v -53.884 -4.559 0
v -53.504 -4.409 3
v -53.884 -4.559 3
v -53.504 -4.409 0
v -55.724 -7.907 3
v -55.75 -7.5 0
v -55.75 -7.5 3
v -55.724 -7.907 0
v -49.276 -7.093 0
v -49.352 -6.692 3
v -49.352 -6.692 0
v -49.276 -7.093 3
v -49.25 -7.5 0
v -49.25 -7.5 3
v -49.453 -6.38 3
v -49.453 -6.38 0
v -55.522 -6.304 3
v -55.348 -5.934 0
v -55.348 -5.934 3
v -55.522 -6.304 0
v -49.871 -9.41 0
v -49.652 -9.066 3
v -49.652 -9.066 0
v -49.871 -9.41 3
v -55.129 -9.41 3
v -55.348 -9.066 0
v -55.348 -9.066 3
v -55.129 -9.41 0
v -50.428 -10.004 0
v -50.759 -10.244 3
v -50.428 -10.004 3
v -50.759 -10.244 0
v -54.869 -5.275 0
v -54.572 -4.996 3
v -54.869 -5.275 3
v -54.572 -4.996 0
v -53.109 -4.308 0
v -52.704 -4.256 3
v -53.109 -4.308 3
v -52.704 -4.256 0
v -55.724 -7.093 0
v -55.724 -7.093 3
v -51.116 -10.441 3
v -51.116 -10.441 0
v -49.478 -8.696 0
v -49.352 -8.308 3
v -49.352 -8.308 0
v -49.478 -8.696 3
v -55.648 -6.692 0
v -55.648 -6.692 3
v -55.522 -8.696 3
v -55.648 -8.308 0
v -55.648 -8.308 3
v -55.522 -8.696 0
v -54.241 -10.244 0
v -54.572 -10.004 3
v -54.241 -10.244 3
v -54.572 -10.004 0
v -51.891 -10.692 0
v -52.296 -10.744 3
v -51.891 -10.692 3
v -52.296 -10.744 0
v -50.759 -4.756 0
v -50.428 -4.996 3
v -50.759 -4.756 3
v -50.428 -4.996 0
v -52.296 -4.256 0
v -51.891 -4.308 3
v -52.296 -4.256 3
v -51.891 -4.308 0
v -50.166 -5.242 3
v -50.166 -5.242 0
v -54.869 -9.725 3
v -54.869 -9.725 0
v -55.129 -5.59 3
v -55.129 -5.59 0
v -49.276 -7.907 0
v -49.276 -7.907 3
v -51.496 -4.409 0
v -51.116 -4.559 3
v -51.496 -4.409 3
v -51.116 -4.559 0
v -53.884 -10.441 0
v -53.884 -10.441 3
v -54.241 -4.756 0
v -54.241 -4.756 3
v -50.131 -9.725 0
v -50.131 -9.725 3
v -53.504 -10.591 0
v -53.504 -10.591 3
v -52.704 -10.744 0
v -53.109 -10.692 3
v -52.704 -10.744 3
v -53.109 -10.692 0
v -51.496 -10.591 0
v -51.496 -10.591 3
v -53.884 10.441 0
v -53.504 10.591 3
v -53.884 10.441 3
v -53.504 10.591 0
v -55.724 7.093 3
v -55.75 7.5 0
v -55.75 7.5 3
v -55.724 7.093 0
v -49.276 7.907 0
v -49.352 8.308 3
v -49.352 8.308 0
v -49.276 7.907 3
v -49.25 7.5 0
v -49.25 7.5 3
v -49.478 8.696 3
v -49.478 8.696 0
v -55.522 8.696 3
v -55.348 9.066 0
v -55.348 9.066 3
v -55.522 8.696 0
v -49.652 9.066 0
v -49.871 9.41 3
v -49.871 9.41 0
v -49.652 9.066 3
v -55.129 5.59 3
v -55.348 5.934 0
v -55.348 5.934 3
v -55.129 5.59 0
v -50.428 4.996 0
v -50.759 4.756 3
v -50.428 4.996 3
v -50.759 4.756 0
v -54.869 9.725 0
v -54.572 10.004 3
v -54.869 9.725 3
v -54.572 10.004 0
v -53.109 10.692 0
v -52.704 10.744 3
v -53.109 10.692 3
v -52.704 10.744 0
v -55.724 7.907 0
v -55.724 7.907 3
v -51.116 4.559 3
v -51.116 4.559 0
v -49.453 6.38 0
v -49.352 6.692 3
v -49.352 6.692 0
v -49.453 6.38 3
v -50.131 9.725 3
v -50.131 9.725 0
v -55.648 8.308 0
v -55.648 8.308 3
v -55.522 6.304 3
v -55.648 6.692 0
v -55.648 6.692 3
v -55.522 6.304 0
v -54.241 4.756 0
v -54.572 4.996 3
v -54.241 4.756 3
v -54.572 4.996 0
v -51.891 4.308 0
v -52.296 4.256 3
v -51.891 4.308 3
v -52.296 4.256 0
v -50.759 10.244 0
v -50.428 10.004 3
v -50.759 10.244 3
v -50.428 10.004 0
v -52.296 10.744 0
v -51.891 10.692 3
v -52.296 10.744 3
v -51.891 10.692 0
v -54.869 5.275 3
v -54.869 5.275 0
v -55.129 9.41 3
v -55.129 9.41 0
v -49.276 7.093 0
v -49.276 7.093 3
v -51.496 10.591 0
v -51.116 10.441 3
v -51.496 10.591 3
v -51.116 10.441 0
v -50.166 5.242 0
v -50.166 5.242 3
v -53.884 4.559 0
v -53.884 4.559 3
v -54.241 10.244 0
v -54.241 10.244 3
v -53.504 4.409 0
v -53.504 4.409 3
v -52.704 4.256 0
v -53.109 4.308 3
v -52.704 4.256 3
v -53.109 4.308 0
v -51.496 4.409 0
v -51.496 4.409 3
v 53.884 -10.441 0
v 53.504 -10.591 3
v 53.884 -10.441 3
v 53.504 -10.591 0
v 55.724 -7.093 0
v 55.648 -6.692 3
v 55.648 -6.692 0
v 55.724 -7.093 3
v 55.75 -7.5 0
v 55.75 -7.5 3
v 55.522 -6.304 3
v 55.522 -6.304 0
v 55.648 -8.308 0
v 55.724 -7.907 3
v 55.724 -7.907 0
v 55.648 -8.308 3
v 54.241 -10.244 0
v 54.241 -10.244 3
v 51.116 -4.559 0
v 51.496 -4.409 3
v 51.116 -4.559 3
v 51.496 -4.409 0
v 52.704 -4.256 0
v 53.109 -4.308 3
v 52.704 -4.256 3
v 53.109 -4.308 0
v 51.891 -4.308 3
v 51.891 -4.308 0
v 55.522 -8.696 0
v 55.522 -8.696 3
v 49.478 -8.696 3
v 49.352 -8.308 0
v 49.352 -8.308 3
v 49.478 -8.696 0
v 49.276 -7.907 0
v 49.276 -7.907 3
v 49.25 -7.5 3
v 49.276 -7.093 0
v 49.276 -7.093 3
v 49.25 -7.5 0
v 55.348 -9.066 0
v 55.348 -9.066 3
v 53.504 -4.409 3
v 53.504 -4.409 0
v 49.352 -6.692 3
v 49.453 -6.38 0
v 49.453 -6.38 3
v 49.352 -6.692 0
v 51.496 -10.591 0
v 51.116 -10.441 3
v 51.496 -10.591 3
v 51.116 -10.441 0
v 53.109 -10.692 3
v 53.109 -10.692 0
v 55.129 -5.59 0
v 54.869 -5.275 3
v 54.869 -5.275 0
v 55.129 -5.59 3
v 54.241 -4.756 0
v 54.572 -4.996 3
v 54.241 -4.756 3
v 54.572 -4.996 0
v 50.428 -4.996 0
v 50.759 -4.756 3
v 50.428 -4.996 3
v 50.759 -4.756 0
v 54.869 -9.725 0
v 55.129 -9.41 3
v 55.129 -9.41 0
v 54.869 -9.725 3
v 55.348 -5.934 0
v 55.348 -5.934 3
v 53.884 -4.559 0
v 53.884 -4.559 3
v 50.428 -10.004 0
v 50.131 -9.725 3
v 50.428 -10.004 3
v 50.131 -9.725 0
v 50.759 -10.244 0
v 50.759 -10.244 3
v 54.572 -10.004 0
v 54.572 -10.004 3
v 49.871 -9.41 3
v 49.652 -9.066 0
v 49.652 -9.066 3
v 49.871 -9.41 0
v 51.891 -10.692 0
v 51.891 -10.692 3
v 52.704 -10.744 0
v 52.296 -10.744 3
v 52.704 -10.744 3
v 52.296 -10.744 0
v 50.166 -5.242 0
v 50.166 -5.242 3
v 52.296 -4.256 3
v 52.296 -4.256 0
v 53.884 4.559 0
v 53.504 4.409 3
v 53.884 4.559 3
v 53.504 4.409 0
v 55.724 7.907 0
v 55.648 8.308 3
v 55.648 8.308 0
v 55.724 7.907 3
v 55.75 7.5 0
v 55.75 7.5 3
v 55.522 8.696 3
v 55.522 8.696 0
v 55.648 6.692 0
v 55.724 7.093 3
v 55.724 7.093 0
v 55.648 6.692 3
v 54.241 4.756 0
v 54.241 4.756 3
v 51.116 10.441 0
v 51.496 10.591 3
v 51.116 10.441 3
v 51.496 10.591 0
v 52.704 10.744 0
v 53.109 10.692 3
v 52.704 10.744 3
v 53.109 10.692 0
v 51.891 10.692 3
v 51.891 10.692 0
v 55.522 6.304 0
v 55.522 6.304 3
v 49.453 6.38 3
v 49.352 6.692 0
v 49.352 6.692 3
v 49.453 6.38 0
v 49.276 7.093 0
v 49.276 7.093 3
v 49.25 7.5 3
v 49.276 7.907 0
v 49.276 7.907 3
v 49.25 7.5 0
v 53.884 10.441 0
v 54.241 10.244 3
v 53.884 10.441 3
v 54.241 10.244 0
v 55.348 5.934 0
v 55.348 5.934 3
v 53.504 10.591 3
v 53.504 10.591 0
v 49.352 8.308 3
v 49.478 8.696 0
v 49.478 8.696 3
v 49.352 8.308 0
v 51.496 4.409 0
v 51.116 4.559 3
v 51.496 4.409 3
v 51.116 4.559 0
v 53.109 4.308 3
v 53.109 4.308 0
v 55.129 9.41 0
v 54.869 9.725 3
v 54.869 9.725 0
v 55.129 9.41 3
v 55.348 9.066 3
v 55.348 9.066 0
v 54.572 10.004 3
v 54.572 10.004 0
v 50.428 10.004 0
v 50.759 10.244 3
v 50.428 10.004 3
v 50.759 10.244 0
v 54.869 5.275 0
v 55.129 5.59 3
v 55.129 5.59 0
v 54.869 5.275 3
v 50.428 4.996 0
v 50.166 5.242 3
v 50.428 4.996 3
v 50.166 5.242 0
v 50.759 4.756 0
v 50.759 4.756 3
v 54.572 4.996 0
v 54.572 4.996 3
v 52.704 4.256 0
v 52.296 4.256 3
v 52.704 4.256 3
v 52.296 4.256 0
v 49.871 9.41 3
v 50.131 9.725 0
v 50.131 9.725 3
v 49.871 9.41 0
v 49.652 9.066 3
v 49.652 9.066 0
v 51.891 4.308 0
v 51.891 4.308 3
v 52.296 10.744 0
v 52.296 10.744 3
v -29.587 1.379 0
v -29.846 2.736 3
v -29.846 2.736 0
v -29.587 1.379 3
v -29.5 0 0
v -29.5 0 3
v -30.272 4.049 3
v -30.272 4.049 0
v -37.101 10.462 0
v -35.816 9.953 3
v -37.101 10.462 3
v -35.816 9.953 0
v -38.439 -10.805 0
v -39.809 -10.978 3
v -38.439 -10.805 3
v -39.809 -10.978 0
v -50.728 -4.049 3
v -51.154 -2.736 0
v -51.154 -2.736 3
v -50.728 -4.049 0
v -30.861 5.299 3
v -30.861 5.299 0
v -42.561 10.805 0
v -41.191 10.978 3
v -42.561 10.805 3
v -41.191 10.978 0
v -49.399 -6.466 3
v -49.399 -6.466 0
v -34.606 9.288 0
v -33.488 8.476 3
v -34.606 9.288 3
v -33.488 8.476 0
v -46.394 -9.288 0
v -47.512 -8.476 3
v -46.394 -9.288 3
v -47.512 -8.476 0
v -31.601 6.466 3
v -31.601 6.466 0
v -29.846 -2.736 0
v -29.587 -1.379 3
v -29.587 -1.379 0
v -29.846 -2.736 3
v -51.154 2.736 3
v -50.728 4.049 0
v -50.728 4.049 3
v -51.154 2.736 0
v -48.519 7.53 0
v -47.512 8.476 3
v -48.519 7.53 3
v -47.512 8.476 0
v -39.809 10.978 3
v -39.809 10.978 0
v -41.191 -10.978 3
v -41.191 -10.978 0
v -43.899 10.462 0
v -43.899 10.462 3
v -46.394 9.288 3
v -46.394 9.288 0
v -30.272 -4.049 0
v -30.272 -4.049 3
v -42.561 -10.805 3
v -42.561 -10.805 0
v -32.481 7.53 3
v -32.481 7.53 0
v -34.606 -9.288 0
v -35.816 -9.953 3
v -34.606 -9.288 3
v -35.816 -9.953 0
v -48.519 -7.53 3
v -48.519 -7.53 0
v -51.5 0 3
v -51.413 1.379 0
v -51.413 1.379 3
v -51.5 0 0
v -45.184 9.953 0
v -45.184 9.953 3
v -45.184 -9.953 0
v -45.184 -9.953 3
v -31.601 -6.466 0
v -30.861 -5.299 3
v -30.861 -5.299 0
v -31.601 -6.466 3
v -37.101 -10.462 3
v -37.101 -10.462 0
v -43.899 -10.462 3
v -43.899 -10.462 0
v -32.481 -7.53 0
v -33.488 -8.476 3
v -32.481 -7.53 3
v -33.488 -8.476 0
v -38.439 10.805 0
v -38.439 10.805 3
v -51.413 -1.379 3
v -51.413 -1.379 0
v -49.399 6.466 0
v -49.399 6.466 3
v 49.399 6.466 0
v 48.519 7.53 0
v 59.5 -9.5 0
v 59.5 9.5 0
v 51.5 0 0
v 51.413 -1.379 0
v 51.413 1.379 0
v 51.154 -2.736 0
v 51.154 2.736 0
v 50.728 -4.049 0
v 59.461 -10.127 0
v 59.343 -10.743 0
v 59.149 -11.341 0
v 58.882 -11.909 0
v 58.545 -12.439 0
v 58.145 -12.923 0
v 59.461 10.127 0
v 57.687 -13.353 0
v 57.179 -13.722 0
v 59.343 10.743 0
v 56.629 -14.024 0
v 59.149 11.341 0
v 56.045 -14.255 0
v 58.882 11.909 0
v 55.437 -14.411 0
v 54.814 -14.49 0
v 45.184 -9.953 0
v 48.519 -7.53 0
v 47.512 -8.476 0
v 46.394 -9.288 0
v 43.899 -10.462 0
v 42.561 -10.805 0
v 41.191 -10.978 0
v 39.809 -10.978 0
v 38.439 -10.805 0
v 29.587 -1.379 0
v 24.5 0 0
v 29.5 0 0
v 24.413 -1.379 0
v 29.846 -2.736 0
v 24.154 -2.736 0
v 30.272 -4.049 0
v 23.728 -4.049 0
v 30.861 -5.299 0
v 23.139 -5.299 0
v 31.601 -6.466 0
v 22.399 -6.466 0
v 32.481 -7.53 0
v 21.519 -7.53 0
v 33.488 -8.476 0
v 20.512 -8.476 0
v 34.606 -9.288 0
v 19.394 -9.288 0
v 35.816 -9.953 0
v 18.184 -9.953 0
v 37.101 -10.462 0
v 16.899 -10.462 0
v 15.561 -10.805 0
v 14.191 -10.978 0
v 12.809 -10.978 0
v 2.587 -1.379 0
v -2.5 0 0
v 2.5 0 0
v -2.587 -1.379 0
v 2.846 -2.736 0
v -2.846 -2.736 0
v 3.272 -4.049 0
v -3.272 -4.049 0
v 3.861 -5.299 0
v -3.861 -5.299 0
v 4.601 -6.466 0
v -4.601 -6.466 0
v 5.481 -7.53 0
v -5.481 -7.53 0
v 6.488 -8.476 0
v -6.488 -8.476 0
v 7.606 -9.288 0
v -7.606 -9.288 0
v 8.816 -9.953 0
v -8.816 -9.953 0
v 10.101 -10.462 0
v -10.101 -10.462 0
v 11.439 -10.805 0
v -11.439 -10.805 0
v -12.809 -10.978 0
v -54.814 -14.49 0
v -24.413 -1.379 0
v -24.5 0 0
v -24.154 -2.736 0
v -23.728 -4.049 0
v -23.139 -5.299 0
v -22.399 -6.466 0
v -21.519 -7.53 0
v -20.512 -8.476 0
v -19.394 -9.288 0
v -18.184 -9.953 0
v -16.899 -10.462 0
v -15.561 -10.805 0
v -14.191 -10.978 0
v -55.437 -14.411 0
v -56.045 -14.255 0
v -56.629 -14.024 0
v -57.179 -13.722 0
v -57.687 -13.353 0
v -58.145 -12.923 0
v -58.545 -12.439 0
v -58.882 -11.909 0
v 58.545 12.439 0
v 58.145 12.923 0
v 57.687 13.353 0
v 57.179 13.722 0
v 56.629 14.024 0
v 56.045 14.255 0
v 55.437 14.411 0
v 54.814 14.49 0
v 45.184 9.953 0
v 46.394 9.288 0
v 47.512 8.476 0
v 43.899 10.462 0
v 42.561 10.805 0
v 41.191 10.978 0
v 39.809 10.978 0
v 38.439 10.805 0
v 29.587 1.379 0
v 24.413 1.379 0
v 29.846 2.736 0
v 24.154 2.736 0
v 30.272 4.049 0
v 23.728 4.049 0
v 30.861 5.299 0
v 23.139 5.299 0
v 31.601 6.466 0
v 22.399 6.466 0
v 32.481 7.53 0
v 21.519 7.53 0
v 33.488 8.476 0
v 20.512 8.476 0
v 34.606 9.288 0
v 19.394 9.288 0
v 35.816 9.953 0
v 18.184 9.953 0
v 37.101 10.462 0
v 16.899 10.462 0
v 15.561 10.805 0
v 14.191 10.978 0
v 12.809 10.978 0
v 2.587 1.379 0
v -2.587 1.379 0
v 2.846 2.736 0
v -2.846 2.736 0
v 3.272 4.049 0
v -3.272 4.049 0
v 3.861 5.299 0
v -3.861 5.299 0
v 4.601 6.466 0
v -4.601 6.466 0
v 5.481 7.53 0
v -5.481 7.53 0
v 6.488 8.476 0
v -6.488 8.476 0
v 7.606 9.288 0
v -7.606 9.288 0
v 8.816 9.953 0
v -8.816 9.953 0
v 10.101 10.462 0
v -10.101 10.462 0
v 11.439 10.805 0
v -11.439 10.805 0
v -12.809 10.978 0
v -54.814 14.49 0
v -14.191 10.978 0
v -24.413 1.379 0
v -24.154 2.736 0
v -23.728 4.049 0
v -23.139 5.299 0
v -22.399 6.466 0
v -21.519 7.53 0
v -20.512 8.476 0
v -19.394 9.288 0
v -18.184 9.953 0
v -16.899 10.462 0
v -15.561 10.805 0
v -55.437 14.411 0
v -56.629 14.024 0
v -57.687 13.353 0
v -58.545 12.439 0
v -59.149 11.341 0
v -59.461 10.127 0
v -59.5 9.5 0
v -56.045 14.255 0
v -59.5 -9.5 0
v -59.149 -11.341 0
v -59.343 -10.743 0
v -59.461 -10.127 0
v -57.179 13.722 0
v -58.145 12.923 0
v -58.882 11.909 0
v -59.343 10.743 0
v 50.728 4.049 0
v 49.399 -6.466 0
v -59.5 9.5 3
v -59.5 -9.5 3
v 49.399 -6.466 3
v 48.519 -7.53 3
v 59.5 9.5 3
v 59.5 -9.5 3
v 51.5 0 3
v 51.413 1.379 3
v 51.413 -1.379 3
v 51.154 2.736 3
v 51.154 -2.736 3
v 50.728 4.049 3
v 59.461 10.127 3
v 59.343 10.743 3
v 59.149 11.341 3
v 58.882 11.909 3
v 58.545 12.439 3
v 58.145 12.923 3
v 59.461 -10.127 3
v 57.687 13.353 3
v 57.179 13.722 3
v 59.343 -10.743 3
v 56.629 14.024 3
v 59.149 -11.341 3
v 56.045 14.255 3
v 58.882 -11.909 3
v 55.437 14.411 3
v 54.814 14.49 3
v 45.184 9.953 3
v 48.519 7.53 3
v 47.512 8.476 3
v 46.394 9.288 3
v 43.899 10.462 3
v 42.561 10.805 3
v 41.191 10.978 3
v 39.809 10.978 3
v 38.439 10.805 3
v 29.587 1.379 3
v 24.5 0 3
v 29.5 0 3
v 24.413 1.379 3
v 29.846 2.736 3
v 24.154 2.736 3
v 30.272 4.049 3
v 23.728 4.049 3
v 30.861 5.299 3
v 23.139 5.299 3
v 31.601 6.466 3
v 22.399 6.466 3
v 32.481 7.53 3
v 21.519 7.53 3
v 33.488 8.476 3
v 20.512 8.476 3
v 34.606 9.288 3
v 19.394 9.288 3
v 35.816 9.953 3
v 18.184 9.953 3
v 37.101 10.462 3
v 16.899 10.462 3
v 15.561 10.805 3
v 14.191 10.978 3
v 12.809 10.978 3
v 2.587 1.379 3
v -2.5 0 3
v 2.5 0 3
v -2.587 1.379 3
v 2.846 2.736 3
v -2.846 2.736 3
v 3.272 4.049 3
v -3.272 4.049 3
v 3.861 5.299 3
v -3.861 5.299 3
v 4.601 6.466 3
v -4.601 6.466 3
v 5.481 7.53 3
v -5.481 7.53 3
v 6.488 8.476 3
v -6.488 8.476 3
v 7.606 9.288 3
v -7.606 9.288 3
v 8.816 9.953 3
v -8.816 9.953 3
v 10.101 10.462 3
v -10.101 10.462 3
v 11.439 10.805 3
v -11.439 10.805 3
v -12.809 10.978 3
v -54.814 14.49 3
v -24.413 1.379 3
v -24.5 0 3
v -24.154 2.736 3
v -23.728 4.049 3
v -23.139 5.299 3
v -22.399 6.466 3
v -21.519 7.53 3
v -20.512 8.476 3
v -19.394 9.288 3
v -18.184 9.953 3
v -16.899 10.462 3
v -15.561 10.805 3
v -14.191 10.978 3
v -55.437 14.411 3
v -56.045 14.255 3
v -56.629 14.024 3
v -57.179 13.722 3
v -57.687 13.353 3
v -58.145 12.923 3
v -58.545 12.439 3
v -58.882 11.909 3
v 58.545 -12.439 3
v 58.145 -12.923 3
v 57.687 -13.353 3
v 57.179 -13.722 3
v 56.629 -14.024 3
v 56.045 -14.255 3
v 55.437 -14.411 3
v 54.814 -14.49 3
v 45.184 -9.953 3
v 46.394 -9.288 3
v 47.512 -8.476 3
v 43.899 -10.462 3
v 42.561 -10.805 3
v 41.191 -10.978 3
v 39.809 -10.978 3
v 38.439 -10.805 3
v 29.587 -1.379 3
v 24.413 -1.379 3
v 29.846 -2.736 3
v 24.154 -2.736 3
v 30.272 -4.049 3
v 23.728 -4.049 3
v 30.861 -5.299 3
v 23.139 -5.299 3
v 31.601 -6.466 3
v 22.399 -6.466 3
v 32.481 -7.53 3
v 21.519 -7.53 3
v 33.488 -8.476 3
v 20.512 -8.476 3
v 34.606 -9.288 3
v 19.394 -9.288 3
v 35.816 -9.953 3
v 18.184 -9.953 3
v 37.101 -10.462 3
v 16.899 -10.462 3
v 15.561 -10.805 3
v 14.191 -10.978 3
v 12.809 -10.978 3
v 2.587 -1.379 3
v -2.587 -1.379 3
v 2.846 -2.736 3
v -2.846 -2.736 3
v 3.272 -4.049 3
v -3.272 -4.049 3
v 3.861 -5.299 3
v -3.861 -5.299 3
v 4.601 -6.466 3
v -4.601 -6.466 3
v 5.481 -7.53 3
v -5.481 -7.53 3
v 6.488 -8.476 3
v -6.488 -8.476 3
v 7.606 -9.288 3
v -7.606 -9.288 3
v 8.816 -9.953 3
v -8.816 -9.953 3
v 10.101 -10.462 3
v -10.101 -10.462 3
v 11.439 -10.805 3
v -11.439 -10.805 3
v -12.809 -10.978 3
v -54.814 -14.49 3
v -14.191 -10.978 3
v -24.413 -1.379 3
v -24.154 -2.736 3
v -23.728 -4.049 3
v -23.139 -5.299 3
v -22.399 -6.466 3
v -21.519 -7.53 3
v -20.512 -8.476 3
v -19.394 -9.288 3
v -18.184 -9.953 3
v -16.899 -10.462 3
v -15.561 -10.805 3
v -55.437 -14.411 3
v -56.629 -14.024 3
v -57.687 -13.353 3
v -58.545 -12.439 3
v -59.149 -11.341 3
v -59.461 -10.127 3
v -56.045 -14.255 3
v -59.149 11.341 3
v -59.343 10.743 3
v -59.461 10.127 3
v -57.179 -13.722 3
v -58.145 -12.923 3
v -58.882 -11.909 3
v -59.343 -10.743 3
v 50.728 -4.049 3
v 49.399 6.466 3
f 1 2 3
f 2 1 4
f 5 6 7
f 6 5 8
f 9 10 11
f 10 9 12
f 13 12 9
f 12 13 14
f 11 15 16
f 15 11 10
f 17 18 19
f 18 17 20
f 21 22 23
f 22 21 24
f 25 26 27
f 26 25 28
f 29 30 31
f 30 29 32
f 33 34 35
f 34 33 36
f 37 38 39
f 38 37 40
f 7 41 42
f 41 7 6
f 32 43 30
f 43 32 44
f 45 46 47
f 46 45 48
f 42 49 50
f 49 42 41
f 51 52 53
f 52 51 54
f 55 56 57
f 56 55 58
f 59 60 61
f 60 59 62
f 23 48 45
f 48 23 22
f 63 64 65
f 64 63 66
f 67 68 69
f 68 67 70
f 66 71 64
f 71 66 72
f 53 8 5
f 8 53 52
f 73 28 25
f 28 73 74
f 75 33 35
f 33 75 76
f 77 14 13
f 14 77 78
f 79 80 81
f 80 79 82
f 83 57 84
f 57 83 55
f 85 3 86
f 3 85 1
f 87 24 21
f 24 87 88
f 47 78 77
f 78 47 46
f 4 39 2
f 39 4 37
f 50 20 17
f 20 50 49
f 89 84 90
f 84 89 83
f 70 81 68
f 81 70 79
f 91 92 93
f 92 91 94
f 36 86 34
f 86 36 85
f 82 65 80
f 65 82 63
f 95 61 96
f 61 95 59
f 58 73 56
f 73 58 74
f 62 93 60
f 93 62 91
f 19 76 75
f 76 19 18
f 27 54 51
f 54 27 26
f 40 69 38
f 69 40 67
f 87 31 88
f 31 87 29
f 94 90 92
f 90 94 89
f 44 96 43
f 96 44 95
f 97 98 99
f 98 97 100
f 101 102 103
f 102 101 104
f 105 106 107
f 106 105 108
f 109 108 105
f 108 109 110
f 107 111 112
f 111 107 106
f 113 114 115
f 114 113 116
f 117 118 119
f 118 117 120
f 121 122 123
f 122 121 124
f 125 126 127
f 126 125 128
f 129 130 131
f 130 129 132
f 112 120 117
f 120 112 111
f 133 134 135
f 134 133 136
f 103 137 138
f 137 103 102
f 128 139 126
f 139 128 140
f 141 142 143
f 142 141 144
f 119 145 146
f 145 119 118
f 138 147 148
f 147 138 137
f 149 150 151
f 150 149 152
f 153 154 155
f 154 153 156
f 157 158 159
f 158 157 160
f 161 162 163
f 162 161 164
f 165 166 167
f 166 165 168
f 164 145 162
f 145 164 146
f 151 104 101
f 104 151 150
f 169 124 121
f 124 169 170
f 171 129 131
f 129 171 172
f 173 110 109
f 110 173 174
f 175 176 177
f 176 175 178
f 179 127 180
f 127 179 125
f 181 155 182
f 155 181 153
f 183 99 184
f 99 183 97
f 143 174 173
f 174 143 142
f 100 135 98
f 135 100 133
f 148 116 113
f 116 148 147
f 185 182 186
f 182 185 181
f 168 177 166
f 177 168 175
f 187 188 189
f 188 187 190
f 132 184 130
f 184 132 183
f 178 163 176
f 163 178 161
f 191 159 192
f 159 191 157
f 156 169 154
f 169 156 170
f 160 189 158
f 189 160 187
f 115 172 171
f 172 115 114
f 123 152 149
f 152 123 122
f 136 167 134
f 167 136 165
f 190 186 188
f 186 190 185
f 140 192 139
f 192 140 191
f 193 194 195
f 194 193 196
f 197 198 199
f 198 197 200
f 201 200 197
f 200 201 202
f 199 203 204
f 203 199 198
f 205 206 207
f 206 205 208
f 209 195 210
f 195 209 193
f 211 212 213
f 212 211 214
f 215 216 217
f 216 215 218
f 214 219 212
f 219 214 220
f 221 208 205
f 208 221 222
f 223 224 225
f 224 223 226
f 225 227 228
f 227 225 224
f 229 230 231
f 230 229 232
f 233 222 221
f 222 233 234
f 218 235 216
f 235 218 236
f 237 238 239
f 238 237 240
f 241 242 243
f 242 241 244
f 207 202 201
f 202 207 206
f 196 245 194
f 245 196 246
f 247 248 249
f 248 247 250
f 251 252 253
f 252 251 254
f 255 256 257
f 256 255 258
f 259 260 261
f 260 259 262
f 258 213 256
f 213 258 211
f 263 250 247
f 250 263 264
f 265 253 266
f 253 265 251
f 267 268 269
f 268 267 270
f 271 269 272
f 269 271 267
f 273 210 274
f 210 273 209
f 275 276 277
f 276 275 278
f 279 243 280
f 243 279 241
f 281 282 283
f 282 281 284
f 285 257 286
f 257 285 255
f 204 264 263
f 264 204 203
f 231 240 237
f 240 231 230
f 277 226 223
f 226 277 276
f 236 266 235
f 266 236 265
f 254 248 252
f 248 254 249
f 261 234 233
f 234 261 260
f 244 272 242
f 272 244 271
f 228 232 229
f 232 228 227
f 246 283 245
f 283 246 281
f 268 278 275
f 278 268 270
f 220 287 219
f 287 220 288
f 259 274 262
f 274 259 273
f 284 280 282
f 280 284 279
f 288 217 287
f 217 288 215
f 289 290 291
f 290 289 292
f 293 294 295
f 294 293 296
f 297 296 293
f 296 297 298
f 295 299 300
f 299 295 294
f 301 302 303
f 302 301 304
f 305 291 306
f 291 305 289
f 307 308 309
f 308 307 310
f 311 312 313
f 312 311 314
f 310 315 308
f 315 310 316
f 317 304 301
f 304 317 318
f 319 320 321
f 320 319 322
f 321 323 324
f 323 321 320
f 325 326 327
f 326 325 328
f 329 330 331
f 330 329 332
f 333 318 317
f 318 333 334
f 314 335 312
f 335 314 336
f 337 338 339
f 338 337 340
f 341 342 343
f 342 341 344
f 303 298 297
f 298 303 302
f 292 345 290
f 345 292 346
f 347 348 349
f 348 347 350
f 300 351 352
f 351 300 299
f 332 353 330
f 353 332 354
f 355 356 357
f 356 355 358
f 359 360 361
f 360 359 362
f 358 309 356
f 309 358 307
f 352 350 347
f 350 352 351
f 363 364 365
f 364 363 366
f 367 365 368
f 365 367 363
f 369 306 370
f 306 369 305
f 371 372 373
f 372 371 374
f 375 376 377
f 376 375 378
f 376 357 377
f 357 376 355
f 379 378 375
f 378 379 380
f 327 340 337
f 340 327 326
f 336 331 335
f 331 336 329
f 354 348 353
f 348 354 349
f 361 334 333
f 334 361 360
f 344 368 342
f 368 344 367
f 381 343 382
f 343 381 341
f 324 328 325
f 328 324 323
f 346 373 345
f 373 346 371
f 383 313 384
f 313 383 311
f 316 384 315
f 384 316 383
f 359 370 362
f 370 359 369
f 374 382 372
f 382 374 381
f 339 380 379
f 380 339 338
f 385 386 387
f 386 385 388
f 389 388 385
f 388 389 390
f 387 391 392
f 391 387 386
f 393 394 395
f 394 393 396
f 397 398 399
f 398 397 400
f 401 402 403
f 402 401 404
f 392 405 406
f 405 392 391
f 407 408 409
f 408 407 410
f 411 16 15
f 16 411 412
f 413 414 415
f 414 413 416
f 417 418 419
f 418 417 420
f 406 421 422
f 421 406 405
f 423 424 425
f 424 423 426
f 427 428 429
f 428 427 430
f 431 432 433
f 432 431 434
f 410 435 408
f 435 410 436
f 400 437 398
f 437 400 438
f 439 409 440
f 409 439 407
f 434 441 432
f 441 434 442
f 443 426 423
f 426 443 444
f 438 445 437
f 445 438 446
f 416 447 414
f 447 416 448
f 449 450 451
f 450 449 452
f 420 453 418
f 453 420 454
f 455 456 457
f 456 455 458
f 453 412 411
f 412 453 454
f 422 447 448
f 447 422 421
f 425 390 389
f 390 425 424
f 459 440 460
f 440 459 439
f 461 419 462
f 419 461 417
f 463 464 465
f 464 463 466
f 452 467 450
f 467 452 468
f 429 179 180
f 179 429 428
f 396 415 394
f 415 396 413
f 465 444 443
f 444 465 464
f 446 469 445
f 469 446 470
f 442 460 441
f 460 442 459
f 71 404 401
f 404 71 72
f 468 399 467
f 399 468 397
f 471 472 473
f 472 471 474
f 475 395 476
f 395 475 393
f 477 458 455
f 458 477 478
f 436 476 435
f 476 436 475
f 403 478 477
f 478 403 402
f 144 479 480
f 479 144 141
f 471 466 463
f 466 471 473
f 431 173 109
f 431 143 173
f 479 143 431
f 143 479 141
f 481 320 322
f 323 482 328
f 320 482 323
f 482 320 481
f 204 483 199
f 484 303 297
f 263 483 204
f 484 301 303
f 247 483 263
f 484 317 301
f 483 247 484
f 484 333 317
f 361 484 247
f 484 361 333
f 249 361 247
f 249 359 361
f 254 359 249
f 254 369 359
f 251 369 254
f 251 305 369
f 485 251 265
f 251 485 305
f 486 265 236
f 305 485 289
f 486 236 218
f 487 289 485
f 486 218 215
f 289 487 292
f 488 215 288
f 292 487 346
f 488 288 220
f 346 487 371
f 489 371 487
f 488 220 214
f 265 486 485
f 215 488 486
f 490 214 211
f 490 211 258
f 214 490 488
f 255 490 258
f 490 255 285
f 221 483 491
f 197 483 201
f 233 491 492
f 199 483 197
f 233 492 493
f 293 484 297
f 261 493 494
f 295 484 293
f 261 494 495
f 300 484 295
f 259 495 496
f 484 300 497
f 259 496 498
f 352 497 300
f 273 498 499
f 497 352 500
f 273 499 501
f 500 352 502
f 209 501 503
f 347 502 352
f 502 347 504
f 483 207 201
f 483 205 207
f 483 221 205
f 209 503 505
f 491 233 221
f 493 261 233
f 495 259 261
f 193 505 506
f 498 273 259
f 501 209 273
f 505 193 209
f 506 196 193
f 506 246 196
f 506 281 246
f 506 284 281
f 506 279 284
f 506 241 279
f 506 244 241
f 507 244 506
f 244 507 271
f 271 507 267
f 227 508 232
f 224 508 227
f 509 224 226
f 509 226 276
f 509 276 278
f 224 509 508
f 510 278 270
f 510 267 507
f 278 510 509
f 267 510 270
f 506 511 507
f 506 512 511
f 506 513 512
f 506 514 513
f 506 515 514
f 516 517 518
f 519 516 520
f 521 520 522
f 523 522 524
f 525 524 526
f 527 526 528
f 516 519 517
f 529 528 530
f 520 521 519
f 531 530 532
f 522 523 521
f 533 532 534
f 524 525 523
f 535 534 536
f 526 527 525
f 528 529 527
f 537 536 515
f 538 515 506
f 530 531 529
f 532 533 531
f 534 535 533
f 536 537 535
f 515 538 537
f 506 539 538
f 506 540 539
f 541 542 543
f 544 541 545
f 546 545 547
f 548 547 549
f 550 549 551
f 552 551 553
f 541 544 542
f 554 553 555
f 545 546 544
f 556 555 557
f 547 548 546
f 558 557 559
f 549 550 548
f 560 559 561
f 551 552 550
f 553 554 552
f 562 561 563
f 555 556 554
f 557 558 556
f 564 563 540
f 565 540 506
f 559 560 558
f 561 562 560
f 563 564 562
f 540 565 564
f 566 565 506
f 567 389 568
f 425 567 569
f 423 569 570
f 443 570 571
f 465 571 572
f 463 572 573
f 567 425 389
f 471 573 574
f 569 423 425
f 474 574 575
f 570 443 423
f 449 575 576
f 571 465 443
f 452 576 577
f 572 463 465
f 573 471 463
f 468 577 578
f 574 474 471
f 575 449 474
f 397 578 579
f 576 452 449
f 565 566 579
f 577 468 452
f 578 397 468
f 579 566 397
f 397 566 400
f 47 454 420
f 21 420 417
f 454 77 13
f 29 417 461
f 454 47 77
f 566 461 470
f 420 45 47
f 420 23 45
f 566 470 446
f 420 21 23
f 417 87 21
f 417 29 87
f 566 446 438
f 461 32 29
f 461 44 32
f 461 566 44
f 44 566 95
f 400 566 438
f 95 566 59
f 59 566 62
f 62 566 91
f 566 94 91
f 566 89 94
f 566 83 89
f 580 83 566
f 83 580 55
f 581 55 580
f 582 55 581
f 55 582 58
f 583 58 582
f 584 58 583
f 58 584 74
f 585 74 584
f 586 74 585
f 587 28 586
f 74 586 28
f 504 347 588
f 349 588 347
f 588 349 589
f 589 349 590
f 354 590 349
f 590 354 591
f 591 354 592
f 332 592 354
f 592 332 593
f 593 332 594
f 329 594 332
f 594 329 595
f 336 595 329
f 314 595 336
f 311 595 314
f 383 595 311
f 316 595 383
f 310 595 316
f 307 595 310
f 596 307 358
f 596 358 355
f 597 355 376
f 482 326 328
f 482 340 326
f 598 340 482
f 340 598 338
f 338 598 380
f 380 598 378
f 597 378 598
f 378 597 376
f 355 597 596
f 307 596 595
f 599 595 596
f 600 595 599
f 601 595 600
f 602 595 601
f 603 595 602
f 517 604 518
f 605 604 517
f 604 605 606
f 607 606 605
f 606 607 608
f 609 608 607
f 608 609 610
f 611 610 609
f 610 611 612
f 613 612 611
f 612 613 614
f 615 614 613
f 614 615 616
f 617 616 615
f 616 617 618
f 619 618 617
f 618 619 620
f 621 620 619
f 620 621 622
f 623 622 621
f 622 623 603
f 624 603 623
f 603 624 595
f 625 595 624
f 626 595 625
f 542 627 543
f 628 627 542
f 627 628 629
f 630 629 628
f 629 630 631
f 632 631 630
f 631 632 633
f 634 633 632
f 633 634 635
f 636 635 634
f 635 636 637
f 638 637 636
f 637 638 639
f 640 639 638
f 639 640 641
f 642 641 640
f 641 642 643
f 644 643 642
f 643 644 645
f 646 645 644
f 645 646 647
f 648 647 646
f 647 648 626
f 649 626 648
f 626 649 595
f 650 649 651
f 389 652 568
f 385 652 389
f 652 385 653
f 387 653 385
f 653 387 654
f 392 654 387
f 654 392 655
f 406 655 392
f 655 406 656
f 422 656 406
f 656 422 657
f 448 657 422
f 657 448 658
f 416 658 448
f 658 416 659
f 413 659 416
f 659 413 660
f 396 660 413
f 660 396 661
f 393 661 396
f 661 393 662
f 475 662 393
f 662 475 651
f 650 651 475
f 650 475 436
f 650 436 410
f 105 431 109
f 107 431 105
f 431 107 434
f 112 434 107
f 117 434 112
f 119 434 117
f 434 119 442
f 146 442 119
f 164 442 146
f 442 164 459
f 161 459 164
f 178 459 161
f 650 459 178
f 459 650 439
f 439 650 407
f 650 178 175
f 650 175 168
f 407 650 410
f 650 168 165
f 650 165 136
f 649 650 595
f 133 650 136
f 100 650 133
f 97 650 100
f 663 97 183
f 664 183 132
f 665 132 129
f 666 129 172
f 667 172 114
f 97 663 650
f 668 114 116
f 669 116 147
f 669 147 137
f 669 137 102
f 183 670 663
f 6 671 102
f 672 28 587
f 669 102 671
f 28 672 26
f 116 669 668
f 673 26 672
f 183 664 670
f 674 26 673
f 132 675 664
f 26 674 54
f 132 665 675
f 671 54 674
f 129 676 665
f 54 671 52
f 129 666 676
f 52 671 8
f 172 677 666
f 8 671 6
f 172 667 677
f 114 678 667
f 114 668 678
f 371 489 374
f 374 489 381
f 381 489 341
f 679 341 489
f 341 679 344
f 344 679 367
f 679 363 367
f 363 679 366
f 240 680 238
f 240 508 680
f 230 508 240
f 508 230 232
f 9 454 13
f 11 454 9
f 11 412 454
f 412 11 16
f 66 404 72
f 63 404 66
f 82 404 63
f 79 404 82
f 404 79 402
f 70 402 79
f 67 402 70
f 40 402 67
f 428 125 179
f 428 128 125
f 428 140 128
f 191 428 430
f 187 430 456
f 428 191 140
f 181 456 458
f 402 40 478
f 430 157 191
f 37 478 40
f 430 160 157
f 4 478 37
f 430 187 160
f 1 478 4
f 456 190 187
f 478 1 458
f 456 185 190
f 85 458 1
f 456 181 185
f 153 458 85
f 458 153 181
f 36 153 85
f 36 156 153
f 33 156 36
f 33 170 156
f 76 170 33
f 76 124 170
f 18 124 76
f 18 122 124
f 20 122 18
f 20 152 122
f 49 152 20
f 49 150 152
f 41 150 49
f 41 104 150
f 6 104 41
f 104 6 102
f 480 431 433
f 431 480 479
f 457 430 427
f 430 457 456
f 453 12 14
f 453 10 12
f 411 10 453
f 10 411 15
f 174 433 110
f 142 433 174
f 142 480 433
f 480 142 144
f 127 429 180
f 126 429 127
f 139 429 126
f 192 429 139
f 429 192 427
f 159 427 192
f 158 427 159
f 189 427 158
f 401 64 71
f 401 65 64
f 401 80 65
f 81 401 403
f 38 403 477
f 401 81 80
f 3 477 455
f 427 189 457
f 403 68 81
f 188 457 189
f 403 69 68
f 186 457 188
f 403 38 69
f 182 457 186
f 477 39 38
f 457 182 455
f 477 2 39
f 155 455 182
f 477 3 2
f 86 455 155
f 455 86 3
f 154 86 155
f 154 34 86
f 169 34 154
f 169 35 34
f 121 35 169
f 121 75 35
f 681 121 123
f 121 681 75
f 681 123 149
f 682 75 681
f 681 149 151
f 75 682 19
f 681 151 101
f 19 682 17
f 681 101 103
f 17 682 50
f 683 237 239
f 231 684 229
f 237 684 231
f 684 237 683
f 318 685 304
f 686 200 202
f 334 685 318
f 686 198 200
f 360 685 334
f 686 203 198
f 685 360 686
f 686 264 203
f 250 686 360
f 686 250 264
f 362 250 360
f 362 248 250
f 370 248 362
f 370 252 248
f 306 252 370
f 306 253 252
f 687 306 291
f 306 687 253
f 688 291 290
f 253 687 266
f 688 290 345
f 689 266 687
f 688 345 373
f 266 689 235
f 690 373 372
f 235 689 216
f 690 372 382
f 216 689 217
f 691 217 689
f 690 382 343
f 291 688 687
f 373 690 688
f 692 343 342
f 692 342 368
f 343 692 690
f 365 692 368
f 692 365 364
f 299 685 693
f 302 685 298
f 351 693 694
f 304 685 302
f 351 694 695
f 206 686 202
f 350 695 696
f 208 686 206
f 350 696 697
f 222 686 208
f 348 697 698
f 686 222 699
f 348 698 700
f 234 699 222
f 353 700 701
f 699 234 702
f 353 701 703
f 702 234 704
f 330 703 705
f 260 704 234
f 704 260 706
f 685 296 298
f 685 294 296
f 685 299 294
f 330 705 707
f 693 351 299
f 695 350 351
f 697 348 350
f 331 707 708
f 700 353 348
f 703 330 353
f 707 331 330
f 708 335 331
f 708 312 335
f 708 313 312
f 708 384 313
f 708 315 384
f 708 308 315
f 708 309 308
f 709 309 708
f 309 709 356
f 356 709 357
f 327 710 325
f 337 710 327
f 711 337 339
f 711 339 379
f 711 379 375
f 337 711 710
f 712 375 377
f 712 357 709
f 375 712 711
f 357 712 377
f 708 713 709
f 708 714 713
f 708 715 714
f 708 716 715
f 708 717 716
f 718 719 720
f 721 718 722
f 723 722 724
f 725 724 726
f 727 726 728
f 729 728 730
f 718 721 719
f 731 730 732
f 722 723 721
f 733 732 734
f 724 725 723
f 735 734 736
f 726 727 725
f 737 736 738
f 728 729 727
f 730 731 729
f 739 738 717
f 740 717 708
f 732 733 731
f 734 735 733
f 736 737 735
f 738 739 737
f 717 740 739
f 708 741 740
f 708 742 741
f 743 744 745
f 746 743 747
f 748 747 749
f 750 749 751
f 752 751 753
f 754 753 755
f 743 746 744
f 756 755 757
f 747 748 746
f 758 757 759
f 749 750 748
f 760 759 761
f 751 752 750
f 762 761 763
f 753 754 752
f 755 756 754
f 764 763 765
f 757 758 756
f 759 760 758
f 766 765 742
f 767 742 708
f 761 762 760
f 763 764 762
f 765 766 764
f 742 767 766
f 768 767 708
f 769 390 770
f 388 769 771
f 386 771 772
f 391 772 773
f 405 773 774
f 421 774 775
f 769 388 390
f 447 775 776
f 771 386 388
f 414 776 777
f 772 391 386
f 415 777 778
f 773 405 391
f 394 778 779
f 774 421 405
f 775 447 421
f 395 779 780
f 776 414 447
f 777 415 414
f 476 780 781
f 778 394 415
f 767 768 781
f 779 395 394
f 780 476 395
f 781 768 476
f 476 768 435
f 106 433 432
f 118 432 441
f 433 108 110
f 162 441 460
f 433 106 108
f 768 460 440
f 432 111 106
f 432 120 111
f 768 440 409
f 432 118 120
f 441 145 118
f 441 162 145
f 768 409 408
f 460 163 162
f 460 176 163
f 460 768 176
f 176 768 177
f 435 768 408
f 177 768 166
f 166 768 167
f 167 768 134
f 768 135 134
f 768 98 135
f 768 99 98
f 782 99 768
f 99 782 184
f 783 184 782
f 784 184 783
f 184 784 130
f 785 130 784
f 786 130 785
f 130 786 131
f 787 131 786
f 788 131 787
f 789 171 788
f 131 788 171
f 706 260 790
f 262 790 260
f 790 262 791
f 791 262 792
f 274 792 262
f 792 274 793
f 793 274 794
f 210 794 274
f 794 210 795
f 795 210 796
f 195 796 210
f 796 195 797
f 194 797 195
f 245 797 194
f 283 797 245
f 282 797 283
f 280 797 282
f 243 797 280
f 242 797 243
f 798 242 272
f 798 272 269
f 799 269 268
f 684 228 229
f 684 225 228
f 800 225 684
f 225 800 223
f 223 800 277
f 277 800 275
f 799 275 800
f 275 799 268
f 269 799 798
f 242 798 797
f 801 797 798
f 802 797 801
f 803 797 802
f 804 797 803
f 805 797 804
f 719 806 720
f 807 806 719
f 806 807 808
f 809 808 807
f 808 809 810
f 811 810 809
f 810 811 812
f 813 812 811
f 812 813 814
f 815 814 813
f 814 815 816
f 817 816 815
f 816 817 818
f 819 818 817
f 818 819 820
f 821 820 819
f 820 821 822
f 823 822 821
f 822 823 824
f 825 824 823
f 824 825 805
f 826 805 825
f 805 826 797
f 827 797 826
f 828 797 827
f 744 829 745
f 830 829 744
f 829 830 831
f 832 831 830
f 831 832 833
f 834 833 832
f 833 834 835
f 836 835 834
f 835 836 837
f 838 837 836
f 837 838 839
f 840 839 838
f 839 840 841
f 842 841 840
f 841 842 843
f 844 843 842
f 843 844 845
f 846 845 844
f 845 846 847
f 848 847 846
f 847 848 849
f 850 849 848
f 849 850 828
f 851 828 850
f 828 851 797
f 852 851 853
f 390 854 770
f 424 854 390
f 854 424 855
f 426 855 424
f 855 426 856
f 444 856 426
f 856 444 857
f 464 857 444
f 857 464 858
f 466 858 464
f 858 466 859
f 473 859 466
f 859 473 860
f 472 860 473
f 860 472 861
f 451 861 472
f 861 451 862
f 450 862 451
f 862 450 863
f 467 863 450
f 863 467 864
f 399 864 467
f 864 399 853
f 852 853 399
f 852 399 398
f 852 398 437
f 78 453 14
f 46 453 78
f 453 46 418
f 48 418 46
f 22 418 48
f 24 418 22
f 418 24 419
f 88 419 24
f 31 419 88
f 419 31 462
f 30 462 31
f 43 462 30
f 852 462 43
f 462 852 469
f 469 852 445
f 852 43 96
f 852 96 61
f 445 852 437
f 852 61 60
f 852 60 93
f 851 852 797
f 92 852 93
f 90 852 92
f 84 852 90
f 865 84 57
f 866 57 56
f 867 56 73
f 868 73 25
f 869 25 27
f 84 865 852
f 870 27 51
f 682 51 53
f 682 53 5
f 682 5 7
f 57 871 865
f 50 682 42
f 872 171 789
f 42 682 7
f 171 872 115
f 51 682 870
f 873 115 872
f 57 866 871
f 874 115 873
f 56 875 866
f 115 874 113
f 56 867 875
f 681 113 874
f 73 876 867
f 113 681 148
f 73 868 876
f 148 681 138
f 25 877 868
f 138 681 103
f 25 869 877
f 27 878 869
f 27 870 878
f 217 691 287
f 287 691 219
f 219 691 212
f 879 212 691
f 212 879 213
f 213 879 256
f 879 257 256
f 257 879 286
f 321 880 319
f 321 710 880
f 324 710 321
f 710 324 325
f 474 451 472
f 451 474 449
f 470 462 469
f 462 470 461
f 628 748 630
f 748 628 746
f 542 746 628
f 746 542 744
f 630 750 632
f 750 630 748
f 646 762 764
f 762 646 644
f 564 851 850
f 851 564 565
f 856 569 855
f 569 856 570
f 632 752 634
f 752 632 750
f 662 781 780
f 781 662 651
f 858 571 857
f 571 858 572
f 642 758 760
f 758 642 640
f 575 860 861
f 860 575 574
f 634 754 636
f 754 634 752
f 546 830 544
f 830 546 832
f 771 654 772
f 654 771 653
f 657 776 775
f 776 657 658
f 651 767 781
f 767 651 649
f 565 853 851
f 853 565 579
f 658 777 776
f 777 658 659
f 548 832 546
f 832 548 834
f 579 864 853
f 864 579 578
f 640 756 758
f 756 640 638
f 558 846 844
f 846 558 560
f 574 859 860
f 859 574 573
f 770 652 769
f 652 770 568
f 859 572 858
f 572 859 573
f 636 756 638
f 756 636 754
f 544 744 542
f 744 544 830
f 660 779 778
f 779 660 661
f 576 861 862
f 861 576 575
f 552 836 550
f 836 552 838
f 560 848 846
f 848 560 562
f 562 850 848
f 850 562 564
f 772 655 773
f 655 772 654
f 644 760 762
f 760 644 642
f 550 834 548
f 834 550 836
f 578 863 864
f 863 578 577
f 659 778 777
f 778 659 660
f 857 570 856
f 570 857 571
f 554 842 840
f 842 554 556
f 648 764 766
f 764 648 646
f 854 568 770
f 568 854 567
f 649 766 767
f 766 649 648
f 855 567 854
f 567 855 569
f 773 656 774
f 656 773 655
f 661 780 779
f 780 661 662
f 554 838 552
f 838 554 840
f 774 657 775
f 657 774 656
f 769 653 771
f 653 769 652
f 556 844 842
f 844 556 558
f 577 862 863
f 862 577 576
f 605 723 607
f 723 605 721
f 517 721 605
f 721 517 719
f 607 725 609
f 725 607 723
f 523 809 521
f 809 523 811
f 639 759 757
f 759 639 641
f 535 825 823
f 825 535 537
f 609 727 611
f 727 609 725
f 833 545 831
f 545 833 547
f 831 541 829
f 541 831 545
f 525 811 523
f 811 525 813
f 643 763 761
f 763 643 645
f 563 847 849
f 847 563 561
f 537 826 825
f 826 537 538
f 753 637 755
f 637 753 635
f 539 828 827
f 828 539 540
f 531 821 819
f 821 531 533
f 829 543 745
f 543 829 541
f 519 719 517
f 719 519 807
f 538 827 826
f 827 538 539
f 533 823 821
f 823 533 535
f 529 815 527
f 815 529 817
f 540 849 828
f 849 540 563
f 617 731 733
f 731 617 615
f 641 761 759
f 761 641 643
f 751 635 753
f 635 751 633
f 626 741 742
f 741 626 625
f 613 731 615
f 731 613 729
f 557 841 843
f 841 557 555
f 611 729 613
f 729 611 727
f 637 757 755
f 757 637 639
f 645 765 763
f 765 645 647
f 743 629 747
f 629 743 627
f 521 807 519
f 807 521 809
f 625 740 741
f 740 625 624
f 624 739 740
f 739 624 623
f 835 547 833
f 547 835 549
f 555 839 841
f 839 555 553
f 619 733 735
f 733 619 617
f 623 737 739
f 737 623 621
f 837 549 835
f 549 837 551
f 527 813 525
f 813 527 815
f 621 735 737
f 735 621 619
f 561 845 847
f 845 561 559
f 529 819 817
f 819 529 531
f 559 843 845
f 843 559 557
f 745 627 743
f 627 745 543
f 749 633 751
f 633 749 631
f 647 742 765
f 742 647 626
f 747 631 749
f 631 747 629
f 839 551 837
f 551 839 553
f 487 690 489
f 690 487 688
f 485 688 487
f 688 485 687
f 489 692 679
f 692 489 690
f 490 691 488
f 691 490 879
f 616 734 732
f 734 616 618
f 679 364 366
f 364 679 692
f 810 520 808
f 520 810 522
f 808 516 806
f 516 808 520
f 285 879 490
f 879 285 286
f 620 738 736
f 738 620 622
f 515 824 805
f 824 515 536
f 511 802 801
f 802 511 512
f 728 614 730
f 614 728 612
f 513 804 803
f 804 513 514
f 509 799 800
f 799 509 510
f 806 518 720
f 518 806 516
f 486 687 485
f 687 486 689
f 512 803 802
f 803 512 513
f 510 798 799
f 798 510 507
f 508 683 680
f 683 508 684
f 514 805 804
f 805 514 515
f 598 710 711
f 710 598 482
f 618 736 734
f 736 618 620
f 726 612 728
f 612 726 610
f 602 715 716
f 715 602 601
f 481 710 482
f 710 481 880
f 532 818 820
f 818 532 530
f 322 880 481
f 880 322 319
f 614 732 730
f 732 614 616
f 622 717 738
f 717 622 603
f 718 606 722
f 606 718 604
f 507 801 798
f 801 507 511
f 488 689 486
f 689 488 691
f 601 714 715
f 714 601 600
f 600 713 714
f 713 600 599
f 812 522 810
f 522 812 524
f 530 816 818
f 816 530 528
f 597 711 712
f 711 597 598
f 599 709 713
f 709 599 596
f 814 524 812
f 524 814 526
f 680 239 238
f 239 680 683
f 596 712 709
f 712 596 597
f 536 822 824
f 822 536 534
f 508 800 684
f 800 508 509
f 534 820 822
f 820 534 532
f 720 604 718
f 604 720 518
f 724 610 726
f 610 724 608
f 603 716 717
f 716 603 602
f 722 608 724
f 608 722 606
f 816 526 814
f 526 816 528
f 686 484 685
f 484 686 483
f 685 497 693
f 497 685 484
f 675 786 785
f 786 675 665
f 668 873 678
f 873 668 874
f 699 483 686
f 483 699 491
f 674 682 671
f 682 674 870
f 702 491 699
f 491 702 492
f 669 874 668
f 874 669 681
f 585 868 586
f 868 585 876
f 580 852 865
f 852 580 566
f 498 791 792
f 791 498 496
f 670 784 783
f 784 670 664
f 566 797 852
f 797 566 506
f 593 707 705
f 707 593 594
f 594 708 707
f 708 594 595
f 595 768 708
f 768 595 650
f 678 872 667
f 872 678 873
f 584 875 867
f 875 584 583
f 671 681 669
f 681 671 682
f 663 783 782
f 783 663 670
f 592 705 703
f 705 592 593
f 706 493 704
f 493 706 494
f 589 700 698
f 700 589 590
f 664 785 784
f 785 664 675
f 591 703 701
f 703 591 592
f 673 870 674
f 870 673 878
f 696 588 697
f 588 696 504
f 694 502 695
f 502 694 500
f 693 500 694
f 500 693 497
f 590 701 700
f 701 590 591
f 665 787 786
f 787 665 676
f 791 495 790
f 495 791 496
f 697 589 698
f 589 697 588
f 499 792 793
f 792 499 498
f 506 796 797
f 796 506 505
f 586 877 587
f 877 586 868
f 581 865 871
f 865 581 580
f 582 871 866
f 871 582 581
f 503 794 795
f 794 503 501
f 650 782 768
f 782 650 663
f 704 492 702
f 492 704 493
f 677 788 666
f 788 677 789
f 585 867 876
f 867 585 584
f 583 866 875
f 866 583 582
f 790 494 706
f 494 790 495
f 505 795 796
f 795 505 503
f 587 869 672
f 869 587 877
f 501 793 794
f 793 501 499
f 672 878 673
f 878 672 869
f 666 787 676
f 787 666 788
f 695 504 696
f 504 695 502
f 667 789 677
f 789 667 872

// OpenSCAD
$fn = 50;


difference() {
	union() {
		hull() {
			translate(v = [-54.5000000000, 9.5000000000, 0]) {
				cylinder(h = 3, r = 5);
			}
			translate(v = [54.5000000000, 9.5000000000, 0]) {
				cylinder(h = 3, r = 5);
			}
			translate(v = [-54.5000000000, -9.5000000000, 0]) {
				cylinder(h = 3, r = 5);
			}
			translate(v = [54.5000000000, -9.5000000000, 0]) {
				cylinder(h = 3, r = 5);
			}
		}
	}
	union() {
		#translate(v = [-52.5000000000, -7.5000000000, -100.0000000000]) {
			cylinder(h = 200, r = 3.2500000000);
		}
		#translate(v = [-52.5000000000, 7.5000000000, -100.0000000000]) {
			cylinder(h = 200, r = 3.2500000000);
		}
		#translate(v = [52.5000000000, -7.5000000000, -100.0000000000]) {
			cylinder(h = 200, r = 3.2500000000);
		}
		#translate(v = [52.5000000000, 7.5000000000, -100.0000000000]) {
			cylinder(h = 200, r = 3.2500000000);
		}
		#translate(v = [-40.5000000000, 0, 0]) {
			cylinder(h = 3, r = 11.0000000000);
		}
		#translate(v = [-13.5000000000, 0, 0]) {
			cylinder(h = 3, r = 11.0000000000);
		}
		#translate(v = [13.5000000000, 0, 0]) {
			cylinder(h = 3, r = 11.0000000000);
		}
		#translate(v = [40.5000000000, 0, 0]) {
			cylinder(h = 3, r = 11.0000000000);
		}
	}
}
